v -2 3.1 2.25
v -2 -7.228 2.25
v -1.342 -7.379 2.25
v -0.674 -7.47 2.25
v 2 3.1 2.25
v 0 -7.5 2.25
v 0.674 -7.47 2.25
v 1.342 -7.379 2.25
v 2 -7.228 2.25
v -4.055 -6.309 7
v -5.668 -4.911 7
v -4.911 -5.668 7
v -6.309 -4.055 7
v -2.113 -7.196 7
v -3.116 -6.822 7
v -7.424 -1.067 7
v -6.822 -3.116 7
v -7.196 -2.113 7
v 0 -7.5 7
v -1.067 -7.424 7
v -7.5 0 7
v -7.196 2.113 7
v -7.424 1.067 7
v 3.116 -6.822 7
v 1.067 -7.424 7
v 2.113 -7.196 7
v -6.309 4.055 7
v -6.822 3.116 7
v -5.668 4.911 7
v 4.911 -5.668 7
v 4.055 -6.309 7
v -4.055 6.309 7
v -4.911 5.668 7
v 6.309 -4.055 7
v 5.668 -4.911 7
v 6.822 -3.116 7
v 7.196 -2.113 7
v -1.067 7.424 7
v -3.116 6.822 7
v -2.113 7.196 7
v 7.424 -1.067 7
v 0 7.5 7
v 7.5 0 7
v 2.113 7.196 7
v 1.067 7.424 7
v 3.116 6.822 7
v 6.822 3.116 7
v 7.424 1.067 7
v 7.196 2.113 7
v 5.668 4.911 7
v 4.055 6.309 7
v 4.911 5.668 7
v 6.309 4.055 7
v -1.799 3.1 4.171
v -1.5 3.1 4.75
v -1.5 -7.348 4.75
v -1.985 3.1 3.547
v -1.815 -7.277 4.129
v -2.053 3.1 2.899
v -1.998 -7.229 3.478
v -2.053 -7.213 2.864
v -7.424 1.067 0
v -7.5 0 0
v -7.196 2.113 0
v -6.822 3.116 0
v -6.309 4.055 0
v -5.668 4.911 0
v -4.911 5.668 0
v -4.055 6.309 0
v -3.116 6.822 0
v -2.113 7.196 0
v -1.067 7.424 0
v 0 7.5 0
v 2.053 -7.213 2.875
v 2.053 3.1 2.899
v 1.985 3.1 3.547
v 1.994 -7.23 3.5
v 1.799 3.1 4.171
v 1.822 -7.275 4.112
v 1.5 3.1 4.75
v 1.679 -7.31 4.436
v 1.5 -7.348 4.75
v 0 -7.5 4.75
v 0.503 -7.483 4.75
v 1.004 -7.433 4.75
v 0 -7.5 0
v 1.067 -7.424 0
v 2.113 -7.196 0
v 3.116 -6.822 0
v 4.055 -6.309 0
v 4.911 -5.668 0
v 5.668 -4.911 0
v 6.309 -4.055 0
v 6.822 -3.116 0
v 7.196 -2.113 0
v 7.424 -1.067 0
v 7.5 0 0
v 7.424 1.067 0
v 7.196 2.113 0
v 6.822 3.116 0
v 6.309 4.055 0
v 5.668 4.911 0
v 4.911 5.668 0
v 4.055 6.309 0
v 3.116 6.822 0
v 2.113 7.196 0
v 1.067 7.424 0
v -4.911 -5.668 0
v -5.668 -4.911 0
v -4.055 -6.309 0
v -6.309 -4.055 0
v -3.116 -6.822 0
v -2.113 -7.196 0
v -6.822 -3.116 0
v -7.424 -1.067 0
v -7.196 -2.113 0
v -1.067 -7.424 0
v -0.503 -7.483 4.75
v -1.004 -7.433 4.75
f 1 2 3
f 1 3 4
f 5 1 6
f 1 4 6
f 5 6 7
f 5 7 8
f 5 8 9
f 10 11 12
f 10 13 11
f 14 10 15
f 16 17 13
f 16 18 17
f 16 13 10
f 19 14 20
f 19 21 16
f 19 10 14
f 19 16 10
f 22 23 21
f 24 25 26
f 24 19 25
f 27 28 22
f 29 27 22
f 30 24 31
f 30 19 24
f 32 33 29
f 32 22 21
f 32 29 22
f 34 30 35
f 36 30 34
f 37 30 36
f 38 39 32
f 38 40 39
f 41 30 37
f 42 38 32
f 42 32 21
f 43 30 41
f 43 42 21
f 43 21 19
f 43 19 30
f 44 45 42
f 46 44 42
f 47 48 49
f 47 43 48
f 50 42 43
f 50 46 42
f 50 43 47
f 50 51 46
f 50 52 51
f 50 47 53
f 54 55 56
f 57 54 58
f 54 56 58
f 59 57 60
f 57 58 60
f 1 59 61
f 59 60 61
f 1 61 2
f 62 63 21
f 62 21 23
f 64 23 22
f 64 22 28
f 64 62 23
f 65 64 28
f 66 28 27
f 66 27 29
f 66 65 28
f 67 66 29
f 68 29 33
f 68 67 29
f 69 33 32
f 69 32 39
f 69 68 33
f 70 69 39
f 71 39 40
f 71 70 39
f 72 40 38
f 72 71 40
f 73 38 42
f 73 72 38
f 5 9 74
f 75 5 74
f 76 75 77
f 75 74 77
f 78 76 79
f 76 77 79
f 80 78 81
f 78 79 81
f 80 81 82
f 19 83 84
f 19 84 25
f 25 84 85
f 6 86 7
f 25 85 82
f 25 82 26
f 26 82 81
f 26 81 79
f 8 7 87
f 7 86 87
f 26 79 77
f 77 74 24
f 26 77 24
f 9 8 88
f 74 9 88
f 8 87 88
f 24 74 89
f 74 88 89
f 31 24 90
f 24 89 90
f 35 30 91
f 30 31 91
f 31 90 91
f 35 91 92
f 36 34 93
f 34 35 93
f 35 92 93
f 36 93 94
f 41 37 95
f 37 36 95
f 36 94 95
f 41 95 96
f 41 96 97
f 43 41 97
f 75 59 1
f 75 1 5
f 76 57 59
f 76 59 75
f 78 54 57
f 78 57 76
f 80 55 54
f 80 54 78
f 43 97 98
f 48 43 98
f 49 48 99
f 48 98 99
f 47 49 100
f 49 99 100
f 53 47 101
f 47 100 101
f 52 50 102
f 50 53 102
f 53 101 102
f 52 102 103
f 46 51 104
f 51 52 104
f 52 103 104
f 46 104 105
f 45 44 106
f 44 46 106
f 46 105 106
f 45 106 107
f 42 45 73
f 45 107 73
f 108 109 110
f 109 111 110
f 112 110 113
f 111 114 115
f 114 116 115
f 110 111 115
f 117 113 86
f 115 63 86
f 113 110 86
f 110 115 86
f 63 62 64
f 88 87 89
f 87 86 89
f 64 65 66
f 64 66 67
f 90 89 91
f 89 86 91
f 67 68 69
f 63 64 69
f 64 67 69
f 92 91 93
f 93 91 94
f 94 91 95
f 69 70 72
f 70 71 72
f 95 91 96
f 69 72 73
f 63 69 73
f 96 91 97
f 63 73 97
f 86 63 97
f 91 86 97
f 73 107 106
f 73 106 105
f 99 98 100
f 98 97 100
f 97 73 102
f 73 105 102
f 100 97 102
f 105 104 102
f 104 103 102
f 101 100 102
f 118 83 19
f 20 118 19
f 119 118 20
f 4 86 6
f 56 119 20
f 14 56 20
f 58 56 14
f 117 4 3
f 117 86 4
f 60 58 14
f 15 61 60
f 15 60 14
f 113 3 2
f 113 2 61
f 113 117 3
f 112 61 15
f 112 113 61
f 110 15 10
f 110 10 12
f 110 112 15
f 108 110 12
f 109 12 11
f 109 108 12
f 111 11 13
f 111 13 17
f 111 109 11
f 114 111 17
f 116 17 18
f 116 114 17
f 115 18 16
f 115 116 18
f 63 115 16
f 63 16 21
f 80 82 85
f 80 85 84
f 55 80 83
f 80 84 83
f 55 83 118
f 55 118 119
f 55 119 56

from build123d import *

# Parameters (mm, degrees)
F0_W        = 15
F0_H        = 15
F1_DEPTH    = 7
F3_DEPTH    = 10.6
F4_T1_DEPTH = 44.5


# Not quite as in the source:
# - a fillet or chamfer that OpenCascade refuses, or shapes differently, is made with other operations: its cross-section is extruded or revolved along the edge and cut away or added


with BuildPart() as f1:
    # F0 (on Top) → F1 (new body)
    with BuildSketch(Plane.XY):
        Rectangle(F0_W, F0_H)
    extrude(amount=F1_DEPTH)

    # F2 (on face) → F3 (cut)
    with BuildSketch(Plane.XZ.offset(7.5)):
        with BuildLine():
            ThreePointArc((2, 2.25), (1.9853102837, 3.5470620567), (1.5, 4.75))
            Line((1.5, 4.75), (-1.5, 4.75))
            ThreePointArc((-1.5, 4.75), (-1.9853102837, 3.5470620567), (-2, 2.25))
            Line((-2, 2.25), (2, 2.25))
        make_face()
    extrude(amount=-F3_DEPTH, mode=Mode.SUBTRACT)

    # F4: fillet of radius 7.5 on 4 edges, made by hand

    # F4_s2 → F4_t1 (cut)
    with BuildSketch(Plane.XY.offset(-18.75)):
        with BuildLine():
            ThreePointArc((0, -7.5), (-5.3033008589, -5.3033008589), (-7.5, 0))
            Line((-7.5, 0), (-7.5, -7.5))
            Line((-7.5, -7.5), (0, -7.5))
        make_face()
        with BuildLine():
            ThreePointArc((0, -7.5), (5.3033008589, -5.3033008589), (7.5, 0))
            Line((7.5, 0), (7.5, -7.5))
            Line((7.5, -7.5), (0, -7.5))
        make_face()
        with BuildLine():
            ThreePointArc((7.5, 0), (5.3033008589, 5.3033008589), (0, 7.5))
            Line((0, 7.5), (7.5, 7.5))
            Line((7.5, 7.5), (7.5, 0))
        make_face()
        with BuildLine():
            ThreePointArc((-7.5, 0), (-5.3033008589, 5.3033008589), (0, 7.5))
            Line((0, 7.5), (-7.5, 7.5))
            Line((-7.5, 7.5), (-7.5, 0))
        make_face()
    extrude(amount=F4_T1_DEPTH, mode=Mode.SUBTRACT)


solid = f1.part
